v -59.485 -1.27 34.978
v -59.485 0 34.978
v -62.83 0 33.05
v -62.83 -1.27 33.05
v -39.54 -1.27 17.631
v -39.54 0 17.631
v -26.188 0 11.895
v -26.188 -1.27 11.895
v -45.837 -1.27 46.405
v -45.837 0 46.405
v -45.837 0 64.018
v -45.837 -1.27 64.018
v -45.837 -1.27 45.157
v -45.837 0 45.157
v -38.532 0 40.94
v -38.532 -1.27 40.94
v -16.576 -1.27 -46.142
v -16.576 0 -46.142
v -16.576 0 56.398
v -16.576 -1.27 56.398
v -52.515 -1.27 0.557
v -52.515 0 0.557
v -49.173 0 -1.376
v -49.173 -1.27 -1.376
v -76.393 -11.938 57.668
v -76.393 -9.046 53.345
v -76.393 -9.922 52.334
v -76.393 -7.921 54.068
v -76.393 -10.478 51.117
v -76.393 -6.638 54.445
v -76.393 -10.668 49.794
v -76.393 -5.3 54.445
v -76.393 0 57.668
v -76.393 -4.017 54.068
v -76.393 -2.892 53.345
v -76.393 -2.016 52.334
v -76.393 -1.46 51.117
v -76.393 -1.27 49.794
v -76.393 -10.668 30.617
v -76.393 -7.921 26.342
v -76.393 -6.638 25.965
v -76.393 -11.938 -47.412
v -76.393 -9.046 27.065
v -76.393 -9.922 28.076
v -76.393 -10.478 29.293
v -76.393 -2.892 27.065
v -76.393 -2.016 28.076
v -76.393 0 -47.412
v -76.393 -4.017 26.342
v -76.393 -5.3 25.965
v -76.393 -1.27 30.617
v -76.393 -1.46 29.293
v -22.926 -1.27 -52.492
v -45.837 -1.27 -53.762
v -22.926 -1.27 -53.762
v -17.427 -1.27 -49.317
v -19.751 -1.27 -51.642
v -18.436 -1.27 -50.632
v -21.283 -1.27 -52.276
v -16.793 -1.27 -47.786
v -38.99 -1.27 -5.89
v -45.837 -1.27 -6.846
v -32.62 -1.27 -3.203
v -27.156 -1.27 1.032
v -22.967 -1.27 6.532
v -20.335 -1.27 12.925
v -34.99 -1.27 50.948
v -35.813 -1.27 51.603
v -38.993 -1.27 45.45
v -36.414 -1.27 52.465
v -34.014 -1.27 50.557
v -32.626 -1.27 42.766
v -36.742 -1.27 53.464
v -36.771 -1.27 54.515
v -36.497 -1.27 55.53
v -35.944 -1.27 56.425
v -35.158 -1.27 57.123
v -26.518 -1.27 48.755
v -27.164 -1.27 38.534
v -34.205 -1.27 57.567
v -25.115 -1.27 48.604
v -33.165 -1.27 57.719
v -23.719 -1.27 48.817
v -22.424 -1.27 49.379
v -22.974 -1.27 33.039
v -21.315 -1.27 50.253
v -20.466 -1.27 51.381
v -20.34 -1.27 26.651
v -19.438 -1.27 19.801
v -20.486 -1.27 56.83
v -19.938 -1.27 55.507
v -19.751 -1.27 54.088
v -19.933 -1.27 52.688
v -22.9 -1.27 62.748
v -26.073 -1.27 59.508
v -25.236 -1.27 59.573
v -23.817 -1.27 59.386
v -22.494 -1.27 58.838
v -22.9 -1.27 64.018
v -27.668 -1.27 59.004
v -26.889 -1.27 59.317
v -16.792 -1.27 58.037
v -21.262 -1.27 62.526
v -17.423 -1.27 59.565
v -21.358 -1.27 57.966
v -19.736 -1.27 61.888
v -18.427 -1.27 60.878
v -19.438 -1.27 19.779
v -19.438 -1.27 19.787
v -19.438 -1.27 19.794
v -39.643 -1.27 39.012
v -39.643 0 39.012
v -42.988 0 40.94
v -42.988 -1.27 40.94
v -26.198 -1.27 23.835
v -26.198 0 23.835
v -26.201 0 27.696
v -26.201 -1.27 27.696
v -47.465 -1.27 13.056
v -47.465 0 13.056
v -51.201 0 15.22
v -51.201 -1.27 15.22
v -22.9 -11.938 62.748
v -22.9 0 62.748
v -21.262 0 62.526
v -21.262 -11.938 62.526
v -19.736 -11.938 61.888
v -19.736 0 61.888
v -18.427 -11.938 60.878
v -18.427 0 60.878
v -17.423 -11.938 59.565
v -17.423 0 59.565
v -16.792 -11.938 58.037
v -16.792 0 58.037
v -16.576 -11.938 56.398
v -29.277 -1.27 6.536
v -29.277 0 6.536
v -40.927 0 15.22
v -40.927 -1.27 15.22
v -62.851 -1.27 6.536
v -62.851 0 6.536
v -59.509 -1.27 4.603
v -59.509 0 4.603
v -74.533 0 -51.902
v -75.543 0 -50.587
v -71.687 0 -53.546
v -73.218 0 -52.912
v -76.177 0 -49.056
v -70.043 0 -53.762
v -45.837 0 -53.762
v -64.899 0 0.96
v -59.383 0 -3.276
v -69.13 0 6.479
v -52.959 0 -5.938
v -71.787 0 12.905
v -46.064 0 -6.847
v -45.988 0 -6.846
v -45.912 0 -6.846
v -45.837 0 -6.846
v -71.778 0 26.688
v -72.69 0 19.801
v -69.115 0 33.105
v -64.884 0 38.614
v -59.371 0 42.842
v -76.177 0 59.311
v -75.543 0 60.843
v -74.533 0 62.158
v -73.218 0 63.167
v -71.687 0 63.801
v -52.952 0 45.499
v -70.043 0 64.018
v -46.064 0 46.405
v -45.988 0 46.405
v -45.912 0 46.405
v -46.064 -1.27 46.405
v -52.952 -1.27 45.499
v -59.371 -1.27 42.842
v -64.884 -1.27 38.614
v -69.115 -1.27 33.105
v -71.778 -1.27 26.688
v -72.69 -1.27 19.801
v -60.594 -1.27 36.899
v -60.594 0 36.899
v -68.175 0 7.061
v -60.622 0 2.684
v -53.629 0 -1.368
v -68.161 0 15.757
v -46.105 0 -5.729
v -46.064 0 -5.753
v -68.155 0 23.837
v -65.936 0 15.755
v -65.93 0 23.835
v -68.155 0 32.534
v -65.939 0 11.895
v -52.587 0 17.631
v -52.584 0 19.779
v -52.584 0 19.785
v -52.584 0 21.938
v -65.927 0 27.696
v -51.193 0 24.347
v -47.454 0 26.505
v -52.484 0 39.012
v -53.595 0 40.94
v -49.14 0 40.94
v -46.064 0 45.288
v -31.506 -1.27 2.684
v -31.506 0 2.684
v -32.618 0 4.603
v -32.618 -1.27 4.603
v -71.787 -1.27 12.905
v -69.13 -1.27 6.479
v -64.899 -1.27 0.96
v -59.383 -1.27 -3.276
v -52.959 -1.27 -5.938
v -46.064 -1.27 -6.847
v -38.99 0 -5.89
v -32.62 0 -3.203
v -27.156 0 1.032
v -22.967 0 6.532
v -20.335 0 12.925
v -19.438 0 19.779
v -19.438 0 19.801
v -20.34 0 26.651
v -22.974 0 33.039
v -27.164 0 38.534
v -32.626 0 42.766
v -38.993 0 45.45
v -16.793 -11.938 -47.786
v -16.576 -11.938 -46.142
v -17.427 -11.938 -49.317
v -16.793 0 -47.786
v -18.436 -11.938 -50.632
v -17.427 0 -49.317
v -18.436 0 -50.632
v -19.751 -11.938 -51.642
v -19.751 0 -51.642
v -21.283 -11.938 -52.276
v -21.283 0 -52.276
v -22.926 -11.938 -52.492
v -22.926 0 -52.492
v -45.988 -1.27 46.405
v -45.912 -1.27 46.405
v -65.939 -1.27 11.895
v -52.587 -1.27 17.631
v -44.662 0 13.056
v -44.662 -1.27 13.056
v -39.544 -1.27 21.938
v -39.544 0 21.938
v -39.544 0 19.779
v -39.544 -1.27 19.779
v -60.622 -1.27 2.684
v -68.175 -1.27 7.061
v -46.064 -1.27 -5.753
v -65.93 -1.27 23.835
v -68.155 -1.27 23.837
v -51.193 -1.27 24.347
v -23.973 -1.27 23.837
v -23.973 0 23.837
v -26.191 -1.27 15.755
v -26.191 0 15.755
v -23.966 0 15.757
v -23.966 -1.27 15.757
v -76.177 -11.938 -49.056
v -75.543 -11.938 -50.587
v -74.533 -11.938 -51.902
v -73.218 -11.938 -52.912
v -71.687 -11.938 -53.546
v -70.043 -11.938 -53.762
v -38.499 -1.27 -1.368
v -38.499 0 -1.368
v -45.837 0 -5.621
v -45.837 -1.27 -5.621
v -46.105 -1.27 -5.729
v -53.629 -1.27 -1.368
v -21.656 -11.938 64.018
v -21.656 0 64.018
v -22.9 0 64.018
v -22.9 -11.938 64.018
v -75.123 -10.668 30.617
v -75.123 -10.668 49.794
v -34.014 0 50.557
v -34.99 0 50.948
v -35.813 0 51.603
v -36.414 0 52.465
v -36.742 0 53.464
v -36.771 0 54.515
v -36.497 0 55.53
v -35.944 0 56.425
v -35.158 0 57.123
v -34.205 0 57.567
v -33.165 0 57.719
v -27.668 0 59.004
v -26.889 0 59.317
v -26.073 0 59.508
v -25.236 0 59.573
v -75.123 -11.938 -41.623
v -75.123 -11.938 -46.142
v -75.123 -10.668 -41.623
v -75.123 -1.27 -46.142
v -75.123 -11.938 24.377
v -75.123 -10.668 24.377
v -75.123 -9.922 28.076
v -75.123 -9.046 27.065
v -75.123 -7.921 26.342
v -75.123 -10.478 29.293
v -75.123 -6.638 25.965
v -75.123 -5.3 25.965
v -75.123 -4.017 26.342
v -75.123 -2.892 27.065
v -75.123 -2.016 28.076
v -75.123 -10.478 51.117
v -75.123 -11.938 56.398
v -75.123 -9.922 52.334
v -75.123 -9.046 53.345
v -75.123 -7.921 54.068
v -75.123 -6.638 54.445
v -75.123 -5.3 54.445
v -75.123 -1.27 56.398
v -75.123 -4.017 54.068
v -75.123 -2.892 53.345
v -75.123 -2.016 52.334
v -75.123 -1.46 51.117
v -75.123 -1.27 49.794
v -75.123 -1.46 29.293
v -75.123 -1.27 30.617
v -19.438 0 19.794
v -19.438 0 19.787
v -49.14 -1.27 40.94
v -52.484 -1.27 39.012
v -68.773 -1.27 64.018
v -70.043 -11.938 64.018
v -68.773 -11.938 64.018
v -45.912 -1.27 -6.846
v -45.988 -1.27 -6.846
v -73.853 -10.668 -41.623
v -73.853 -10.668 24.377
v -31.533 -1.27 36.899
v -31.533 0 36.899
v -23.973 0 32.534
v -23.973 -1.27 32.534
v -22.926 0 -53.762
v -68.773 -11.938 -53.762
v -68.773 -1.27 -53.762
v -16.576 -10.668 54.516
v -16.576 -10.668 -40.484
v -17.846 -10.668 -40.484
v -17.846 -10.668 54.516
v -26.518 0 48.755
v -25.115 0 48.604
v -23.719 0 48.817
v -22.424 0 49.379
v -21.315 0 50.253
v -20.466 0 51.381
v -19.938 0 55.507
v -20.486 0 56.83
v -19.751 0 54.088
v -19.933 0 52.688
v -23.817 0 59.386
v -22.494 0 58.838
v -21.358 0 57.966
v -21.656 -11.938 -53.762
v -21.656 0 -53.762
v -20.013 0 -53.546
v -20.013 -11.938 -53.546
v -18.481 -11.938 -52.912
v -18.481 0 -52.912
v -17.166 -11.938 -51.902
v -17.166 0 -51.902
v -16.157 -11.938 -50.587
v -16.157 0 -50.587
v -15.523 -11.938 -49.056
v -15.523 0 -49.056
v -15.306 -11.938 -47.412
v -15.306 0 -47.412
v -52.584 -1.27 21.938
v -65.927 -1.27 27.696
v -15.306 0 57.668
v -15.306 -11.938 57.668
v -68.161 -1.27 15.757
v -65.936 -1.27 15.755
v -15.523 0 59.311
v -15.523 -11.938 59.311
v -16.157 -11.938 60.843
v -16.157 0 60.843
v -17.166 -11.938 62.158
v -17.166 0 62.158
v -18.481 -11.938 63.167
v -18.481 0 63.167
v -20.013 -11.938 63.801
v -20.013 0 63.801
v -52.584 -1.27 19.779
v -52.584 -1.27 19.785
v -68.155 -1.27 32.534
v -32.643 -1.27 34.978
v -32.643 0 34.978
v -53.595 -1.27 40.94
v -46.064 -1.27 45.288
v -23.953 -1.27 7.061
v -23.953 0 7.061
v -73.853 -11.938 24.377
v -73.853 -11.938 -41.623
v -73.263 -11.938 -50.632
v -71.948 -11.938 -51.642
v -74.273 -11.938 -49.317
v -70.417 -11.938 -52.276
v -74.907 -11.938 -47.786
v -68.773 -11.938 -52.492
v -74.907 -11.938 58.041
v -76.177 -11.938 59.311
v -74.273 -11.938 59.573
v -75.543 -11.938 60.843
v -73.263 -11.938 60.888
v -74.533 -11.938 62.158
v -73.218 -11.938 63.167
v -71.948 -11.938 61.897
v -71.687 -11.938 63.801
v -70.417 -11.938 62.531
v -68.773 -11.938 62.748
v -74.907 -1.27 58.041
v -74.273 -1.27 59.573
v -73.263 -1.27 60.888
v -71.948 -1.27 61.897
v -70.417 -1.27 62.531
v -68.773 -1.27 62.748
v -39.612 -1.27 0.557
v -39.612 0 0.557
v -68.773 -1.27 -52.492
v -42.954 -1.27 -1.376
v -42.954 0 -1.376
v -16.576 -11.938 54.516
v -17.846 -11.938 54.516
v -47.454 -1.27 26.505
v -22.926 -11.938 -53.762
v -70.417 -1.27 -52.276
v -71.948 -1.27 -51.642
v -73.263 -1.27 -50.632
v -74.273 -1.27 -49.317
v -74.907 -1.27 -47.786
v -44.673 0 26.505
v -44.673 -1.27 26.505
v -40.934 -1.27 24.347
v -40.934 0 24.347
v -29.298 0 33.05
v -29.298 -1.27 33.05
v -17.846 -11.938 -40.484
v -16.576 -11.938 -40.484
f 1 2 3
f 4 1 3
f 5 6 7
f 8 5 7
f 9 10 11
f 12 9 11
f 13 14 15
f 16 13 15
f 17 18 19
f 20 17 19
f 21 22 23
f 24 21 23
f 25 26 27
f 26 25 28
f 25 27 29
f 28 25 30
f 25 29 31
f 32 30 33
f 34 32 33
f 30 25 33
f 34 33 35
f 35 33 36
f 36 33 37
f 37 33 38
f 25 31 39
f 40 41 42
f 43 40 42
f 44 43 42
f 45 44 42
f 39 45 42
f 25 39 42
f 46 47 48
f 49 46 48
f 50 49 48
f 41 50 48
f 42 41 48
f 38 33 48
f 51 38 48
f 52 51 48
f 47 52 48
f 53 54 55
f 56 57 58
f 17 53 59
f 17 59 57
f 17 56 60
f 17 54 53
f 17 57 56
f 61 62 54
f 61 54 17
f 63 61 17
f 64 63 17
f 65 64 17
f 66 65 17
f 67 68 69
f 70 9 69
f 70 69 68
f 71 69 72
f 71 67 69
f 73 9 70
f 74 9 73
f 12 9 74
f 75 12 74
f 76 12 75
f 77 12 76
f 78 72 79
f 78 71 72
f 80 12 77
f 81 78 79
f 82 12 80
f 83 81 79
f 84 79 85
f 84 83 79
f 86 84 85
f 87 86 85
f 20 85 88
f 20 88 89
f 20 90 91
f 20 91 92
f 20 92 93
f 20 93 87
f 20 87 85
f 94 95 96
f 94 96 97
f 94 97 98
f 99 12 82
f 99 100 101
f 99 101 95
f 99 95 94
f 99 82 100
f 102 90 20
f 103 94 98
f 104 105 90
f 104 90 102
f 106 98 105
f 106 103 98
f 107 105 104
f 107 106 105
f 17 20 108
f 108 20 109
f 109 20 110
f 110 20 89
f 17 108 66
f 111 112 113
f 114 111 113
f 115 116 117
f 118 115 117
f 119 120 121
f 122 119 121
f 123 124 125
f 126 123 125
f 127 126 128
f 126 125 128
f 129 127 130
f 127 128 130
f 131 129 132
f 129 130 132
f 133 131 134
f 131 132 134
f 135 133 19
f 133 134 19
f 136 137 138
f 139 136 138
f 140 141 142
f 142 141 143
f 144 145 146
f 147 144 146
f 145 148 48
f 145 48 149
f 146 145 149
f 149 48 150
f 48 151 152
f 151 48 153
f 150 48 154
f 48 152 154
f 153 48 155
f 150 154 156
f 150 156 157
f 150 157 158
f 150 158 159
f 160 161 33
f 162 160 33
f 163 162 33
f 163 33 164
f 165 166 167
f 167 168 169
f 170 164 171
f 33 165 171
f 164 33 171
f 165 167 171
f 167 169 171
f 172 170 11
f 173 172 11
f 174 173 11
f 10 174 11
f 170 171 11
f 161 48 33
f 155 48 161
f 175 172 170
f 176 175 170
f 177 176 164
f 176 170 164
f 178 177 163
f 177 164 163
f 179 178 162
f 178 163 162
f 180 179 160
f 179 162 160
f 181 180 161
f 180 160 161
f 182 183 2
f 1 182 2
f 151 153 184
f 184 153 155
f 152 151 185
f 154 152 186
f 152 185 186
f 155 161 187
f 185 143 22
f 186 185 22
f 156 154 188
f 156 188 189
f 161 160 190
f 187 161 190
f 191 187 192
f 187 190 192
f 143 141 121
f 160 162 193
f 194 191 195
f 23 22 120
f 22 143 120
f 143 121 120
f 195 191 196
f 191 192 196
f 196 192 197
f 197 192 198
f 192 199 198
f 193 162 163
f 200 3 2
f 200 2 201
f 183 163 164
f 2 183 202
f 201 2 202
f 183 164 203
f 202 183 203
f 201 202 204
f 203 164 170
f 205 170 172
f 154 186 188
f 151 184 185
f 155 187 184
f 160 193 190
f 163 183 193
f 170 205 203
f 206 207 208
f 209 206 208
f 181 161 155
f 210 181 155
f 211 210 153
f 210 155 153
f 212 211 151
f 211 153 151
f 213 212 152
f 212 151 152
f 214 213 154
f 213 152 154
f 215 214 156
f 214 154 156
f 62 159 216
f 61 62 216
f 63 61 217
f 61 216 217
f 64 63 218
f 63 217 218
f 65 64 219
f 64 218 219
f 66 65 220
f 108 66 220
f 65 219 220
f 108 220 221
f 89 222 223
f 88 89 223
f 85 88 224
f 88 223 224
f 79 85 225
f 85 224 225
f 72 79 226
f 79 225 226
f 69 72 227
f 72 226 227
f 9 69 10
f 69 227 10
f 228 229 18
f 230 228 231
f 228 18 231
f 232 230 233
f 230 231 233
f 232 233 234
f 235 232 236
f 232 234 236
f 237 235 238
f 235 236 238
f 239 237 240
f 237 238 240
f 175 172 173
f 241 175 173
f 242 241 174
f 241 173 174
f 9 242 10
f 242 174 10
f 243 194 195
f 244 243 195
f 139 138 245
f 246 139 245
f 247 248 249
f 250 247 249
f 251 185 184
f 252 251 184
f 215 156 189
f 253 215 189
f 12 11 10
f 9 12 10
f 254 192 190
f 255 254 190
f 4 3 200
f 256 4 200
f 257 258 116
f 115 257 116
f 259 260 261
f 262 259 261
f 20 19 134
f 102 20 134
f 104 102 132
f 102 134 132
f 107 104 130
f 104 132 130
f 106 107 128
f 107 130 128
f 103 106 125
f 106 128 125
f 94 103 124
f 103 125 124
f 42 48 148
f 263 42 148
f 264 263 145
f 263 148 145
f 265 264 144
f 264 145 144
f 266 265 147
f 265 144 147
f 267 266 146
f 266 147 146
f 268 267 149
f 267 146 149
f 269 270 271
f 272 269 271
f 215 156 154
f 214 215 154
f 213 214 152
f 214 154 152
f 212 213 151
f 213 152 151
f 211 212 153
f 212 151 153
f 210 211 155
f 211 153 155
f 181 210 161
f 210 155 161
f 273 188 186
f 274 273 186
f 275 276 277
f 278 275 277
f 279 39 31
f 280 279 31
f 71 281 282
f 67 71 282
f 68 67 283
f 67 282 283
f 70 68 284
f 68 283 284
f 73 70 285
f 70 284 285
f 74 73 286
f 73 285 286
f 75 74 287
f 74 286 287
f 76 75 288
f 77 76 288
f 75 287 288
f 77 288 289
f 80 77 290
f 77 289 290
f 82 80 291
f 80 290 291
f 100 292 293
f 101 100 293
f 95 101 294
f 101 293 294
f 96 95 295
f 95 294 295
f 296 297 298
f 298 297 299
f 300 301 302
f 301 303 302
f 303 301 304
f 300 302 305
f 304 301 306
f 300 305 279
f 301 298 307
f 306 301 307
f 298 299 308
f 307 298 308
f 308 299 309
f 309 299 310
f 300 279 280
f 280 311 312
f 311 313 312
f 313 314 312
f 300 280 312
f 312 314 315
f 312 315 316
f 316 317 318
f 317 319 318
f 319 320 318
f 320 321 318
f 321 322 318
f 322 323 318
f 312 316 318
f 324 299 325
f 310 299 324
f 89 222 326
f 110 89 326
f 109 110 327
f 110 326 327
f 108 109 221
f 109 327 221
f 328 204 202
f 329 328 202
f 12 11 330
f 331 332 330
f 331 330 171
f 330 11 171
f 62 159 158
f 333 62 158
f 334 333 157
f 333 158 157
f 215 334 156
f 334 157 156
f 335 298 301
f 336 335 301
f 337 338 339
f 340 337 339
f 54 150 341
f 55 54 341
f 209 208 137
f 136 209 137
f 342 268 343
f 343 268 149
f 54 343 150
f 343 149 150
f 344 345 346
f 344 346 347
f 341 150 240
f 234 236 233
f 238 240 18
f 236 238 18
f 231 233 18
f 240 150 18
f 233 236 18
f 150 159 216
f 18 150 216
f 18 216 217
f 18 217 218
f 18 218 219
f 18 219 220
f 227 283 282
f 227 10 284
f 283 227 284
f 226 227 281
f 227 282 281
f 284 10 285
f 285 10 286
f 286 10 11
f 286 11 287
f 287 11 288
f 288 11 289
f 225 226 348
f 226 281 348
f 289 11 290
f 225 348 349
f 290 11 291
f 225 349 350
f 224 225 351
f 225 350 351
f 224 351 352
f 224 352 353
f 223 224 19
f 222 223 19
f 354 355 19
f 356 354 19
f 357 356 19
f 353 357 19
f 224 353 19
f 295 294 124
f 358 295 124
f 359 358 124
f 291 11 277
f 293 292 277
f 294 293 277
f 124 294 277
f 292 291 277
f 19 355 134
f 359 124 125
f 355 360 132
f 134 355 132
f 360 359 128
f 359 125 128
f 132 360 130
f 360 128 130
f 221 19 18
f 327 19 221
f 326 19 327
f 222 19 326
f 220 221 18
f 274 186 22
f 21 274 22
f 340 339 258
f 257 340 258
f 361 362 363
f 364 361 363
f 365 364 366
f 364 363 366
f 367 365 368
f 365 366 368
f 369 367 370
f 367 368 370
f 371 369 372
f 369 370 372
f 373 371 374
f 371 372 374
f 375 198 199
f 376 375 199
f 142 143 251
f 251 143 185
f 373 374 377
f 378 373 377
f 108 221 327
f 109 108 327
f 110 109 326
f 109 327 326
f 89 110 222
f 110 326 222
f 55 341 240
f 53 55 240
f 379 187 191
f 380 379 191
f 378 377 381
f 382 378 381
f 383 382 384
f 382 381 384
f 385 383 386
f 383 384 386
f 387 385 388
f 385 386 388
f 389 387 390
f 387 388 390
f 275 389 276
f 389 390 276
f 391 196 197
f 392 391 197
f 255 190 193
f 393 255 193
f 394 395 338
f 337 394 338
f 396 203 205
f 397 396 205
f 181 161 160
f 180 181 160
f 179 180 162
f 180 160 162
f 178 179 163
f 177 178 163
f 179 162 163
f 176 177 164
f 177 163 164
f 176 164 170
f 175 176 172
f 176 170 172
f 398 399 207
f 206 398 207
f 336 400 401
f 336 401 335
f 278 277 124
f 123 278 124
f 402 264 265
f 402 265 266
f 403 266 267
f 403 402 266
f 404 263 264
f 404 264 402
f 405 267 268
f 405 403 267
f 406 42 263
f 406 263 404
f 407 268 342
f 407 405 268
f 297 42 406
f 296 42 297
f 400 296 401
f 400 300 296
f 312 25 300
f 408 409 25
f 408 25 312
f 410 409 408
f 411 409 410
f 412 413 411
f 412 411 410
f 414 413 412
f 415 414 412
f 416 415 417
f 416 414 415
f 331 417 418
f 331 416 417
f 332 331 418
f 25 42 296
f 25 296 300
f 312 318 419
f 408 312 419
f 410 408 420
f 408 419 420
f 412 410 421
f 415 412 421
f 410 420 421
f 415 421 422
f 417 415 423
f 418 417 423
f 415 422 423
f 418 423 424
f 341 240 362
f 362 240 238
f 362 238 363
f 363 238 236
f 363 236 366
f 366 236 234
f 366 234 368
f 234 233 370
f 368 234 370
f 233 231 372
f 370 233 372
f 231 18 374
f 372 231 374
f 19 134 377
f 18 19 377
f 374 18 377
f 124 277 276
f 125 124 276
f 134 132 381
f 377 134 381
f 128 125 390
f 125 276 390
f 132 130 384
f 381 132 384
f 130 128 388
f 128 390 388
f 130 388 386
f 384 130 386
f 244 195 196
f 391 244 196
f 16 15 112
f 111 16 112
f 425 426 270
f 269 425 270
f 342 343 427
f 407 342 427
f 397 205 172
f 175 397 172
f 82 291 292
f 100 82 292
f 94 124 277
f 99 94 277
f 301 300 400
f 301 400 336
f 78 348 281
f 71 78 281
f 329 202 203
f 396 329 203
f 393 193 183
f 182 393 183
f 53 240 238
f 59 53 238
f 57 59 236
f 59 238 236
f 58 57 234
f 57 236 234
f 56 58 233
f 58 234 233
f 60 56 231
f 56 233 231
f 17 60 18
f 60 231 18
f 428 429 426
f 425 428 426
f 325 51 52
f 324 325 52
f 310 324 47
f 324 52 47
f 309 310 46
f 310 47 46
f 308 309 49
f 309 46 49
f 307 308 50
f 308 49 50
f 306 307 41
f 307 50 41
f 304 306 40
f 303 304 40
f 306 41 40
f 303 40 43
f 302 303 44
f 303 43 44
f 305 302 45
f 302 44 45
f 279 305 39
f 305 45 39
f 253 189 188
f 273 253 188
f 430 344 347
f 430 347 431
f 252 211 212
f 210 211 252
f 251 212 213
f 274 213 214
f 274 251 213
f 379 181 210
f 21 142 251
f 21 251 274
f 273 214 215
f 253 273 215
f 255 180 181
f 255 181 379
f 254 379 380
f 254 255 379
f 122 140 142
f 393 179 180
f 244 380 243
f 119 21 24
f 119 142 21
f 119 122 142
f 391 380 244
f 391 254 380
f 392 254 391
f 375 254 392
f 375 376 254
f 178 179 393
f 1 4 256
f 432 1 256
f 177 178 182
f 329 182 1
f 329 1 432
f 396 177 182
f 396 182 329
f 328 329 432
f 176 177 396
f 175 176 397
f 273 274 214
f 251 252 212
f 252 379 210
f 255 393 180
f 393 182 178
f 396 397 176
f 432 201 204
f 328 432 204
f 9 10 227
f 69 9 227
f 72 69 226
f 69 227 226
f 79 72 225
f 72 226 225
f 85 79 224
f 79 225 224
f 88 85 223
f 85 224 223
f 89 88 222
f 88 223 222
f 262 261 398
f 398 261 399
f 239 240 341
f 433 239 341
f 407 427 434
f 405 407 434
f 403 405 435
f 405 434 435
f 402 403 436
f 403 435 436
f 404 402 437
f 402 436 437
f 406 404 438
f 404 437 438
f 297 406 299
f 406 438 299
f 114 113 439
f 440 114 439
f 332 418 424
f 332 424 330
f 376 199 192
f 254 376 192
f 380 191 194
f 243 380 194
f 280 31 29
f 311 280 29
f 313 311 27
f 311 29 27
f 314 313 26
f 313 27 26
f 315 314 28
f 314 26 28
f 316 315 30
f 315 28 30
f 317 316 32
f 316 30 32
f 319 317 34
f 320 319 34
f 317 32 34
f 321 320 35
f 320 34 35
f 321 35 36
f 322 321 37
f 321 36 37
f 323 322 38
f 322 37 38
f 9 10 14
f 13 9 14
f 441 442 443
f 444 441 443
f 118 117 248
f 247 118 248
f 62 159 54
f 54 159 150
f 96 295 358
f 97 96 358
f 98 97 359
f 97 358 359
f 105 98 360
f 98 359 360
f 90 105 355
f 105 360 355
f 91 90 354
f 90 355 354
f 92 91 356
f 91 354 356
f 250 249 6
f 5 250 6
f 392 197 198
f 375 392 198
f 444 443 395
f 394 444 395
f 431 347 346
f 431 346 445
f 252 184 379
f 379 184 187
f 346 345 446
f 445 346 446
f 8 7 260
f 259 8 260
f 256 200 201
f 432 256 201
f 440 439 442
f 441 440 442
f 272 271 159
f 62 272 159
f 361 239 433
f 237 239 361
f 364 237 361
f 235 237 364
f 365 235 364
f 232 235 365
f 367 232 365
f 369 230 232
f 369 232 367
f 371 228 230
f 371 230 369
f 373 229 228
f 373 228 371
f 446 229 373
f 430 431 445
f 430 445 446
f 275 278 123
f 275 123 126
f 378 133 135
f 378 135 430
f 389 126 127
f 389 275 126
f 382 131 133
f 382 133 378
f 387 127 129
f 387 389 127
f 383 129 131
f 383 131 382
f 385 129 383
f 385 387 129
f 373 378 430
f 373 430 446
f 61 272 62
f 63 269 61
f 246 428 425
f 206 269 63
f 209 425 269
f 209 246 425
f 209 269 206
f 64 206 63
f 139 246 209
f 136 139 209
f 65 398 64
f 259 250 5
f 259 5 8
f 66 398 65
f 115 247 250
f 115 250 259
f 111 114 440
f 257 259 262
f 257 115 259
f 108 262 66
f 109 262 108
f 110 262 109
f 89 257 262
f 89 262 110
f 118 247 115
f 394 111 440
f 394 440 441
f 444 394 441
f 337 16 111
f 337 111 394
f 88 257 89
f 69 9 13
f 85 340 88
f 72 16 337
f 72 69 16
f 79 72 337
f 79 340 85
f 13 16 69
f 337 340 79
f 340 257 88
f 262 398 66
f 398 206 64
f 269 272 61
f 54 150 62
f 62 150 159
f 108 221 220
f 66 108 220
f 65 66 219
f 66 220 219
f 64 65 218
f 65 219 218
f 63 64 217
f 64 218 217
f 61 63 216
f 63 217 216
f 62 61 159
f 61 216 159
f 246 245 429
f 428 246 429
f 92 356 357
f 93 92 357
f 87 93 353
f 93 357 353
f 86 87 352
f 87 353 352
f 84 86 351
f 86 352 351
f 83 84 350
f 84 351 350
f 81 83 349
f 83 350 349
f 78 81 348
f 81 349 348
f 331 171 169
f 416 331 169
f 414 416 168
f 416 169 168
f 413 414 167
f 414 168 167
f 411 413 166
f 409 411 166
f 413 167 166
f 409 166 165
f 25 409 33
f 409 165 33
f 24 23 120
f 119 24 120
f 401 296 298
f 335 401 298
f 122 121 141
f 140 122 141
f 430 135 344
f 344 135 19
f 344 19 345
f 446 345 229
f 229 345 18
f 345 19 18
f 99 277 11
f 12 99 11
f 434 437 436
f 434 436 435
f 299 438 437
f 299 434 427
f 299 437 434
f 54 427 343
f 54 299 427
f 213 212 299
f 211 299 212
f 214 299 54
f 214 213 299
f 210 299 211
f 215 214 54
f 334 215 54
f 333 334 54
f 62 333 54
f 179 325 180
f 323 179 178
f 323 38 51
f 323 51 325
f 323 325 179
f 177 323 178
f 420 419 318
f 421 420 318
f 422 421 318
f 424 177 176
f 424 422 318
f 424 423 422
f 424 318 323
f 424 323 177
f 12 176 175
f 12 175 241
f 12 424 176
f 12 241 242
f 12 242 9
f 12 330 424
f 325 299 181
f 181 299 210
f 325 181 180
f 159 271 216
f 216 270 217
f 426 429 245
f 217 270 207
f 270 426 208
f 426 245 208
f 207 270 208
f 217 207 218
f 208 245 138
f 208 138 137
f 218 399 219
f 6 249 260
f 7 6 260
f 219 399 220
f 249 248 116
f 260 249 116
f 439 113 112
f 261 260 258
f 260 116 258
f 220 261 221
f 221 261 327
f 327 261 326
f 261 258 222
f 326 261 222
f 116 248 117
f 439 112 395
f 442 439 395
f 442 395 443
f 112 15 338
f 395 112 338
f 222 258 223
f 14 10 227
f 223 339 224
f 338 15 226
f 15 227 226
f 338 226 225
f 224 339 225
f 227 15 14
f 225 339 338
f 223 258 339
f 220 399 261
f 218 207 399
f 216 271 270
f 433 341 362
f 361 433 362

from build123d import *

# Parameters (mm, degrees)
F1_DEPTH  = 1.27
F2_DEPTH  = 11.938
F4_DEPTH  = 25.4
F5_DEPTH  = 1.27
F6_DEPTH  = 1.27
F7_W      = 1.27
F7_H      = 66
F8_DEPTH  = 1.27
F9_W      = 1.27
F9_H      = 95
F10_DEPTH = 1.27


# Not quite as in the source:
# - ends of sketch curves that miss each other by under 0.0002 mm in the source are joined


with BuildPart() as f1:
    # F0 (on Front) → F1 (new body)
    with BuildSketch(Plane.XZ):
        with BuildLine():
            ThreePointArc((-68.7733714747, 62.7475070371), (-73.2634995352, 60.8876350976), (-75.1233714747, 56.3975070371))
            Line((-75.1233714747, 56.3975070371), (-75.1233714747, -46.1422929629))
            ThreePointArc((-75.1233714747, -46.1422929629), (-73.2634995352, -50.6324210235), (-68.7733714747, -52.4922929629))
            Line((-68.7733714747, -52.4922929629), (-68.7733714747, -53.7622929629))
            Line((-68.7733714747, -53.7622929629), (-45.83683555, -53.7622929629))
            Line((-45.83683555, -53.7622929629), (-45.83683555, -6.8455746123))
            ThreePointArc((-45.83683555, -6.8455746123), (-45.9503157475, -6.8463001174), (-46.0637980065, -6.8465419539))
            ThreePointArc((-46.0637980065, -6.8465419539), (-64.8987750617, 0.95958485), (-72.689796607, 19.800815161))
            ThreePointArc((-72.689796607, 19.800815161), (-64.8836783627, 38.6144422615), (-46.0637980065, 46.4054723665))
            ThreePointArc((-46.0637980065, 46.4054723665), (-45.9503157475, 46.4052305299), (-45.83683555, 46.4045050248))
            Line((-45.83683555, 46.4045050248), (-45.83683555, 64.0175070371))
            Line((-45.83683555, 64.0175070371), (-68.7733714747, 64.0175070371))
            Line((-68.7733714747, 64.0175070371), (-68.7733714747, 62.7475070371))
        make_face()
    extrude(amount=F1_DEPTH)

    # F0 (on Front) → F2 (join)
    with BuildSketch(Plane.XZ):
        with BuildLine():
            Line((-75.1233714747, -46.1422929629), (-75.1233714747, 56.3975070371))
            ThreePointArc((-75.1233714747, 56.3975070371), (-73.2634995352, 60.8876350976), (-68.7733714747, 62.7475070371))
            Line((-68.7733714747, 62.7475070371), (-68.7733714747, 64.0175070371))
            Line((-68.7733714747, 64.0175070371), (-70.0433714747, 64.0175070371))
            ThreePointArc((-70.0433714747, 64.0175070371), (-74.5334995352, 62.1576350976), (-76.3933714747, 57.6675070371))
            Line((-76.3933714747, 57.6675070371), (-76.3933714747, -47.4122929629))
            ThreePointArc((-76.3933714747, -47.4122929629), (-74.5334995352, -51.9024210235), (-70.0433714747, -53.7622929629))
            Line((-70.0433714747, -53.7622929629), (-68.7733714747, -53.7622929629))
            Line((-68.7733714747, -53.7622929629), (-68.7733714747, -52.4922929629))
            ThreePointArc((-68.7733714747, -52.4922929629), (-73.2634995352, -50.6324210235), (-75.1233714747, -46.1422929629))
        make_face()
    extrude(amount=F2_DEPTH)

    # F3 (on face) → F4 (cut)
    with BuildSketch(Plane(origin=(-76.3933714747, 0, 0), x_dir=(0, -1, 0), z_dir=(-1, 0, 0))):
        with BuildLine():
            Line((10.668, 30.6165070371), (10.668, 49.7935070371))
            ThreePointArc((10.668, 49.7935070371), (5.969, 45.0945070371), (1.27, 49.7935070371))
            Line((1.27, 49.7935070371), (1.27, 30.6165070371))
            ThreePointArc((1.27, 30.6165070371), (5.969, 35.3155070371), (10.668, 30.6165070371))
        make_face()
        with BuildLine():
            ThreePointArc((1.27, 49.7935070371), (5.969, 45.0945070371), (10.668, 49.7935070371))
            ThreePointArc((10.668, 49.7935070371), (5.969, 54.4925070371), (1.27, 49.7935070371))
        make_face()
        with BuildLine():
            ThreePointArc((1.27, 30.6165070371), (5.969, 25.9175070371), (10.668, 30.6165070371))
            ThreePointArc((10.668, 30.6165070371), (5.969, 35.3155070371), (1.27, 30.6165070371))
        make_face()
    extrude(amount=-F4_DEPTH, mode=Mode.SUBTRACT)

    # F7 (on face) → F8 (join)
    with BuildSketch(Plane.YZ.offset(-75.1233714747)):
        with Locations((-11.303, -8.6227470934)):
            Rectangle(F7_W, F7_H)
    extrude(amount=F8_DEPTH)


with BuildPart() as f2:
    # F0 (on Front) → F2, piece 2 (new body)
    with BuildSketch(Plane.XZ):
        with BuildLine():
            Line((-21.6563714747, 64.0175070371), (-22.9002996252, 64.0175070371))
            Line((-22.9002996252, 64.0175070371), (-22.9002996252, 62.7475070371))
            ThreePointArc((-22.9002996252, 62.7475070371), (-18.4270350656, 60.8784613489), (-16.5763714747, 56.3975605602))
            Line((-16.5763714747, 56.3975605602), (-16.5763714747, -46.1422929629))
            ThreePointArc((-16.5763714747, -46.1422929629), (-18.4362434142, -50.6324210235), (-22.9263714747, -52.4922929629))
            Line((-22.9263714747, -52.4922929629), (-22.9263714747, -53.7622929629))
            Line((-22.9263714747, -53.7622929629), (-21.6563714747, -53.7622929629))
            ThreePointArc((-21.6563714747, -53.7622929629), (-17.1662434142, -51.9024210235), (-15.3063714747, -47.4122929629))
            Line((-15.3063714747, -47.4122929629), (-15.3063714747, 57.6675070371))
            ThreePointArc((-15.3063714747, 57.6675070371), (-17.1662434142, 62.1576350976), (-21.6563714747, 64.0175070371))
        make_face()
    extrude(amount=F2_DEPTH)

    # F9 (on face) → F10 (join)
    with BuildSketch(Plane(origin=(-16.5763714747, 0, 0), x_dir=(0, -1, 0), z_dir=(-1, 0, 0))):
        with Locations((11.303, 7.0158497989)):
            Rectangle(F9_W, F9_H)
    extrude(amount=F10_DEPTH)


with BuildPart() as f5:
    # F0 (on Front) → F5 (new body)
    with BuildSketch(Plane.XZ):
        with BuildLine():
            Line((-22.9002996252, 64.0175070371), (-45.83683555, 64.0175070371))
            Line((-45.83683555, 64.0175070371), (-45.83683555, 46.4045050248))
            ThreePointArc((-45.83683555, 46.4045050248), (-27.1638123458, 38.534059292), (-19.437799406, 19.800815161))
            ThreePointArc((-19.437799406, 19.800815161), (-19.4377929862, 19.7901401845), (-19.4377908463, 19.7794652063))
            ThreePointArc((-19.4377908463, 19.7794652063), (-27.1562947169, 1.0324500665), (-45.83683555, -6.8455746123))
            Line((-45.83683555, -6.8455746123), (-45.83683555, -53.7622929629))
            Line((-45.83683555, -53.7622929629), (-22.9263714747, -53.7622929629))
            Line((-22.9263714747, -53.7622929629), (-22.9263714747, -52.4922929629))
            ThreePointArc((-22.9263714747, -52.4922929629), (-18.4362434142, -50.6324210235), (-16.5763714747, -46.1422929629))
            Line((-16.5763714747, -46.1422929629), (-16.5763714747, 56.3975605602))
            ThreePointArc((-16.5763714747, 56.3975605602), (-18.4270350656, 60.8784613489), (-22.9002996252, 62.7475070371))
            Line((-22.9002996252, 62.7475070371), (-22.9002996252, 64.0175070371))
        make_face()
        with BuildLine():
            ThreePointArc((-25.2361353487, 59.5725070371), (-21.3578216202, 57.9660568916), (-19.7513714747, 54.0877431631))
            ThreePointArc((-19.7513714747, 54.0877431631), (-21.8412711567, 49.7798977769), (-26.5183106895, 48.7549520413))
            Line((-26.5183106895, 48.7549520413), (-34.0138568088, 50.5571235836))
            ThreePointArc((-34.0138568088, 50.5571235836), (-36.7709747399, 54.5151516939), (-33.1649817526, 57.7189775918))
            Line((-33.1649817526, 57.7189775918), (-27.6676093993, 59.0041004217))
            ThreePointArc((-27.6676093993, 59.0041004217), (-26.4846496797, 59.4285152719), (-25.2361353487, 59.5725070371))
        make_face(mode=Mode.SUBTRACT)
    extrude(amount=F5_DEPTH)


with BuildPart() as f6:
    # F0 (on Front) → F6 (new body)
    with BuildSketch(Plane.XZ):
        with BuildLine():
            ThreePointArc((-19.437799406, 19.800815161), (-27.1638123458, 38.534059292), (-45.83683555, 46.4045050248))
            Line((-45.83683555, 46.4045050248), (-45.83683555, 45.1567237107))
            Line((-45.83683555, 45.1567237107), (-38.5324436739, 40.9395310947))
            Line((-38.5324436739, 40.9395310947), (-31.5334607695, 36.8986664309))
            Line((-31.5334607695, 36.8986664309), (-23.972966235, 32.5336128762))
            Line((-23.972966235, 32.5336128762), (-23.972966235, 23.8371539736))
            Line((-23.972966235, 23.8371539736), (-23.972966235, 19.8148920808))
            Line((-23.972966235, 19.8148920808), (-23.972966235, 19.7971786549))
            Line((-23.972966235, 19.7971786549), (-19.437799406, 19.800815161))
        make_face()
        with BuildLine():
            Line((-45.83683555, -5.6209802107), (-45.83683555, -6.8455746123))
            ThreePointArc((-45.83683555, -6.8455746123), (-27.1562947169, 1.0324500665), (-19.4377908463, 19.7794652063))
            ThreePointArc((-19.4377908463, 19.7794652063), (-19.4377929862, 19.7901401845), (-19.437799406, 19.800815161))
            Line((-19.437799406, 19.800815161), (-23.972966235, 19.7971786549))
            Line((-23.972966235, 19.7971786549), (-23.972966235, 19.7794652063))
            Line((-23.972966235, 19.7794652063), (-23.9664873618, 15.7572085313))
            Line((-23.9664873618, 15.7572085313), (-23.9525409264, 7.0607608116))
            Line((-23.9525409264, 7.0607608116), (-31.5060255403, 2.6835881708))
            Line((-31.5060255403, 2.6835881708), (-38.4985191452, -1.3684955049))
            Line((-38.4985191452, -1.3684955049), (-45.83683555, -5.6209802107))
        make_face()
        Polygon((-31.5334607695, 36.8986664309), (-38.5324436739, 40.9395310947), (-39.6432602587, 39.0119725608), (-32.6425828079, 34.9776107085), align=None)
        Polygon((-23.972966235, 19.7794652063), (-23.972966235, 19.7971786549), (-26.1944497484, 19.7953973669), (-26.1912103118, 15.7554246458), (-23.9664873618, 15.7572085313), align=None)
        Polygon((-26.1944497484, 19.7953973669), (-23.972966235, 19.7971786549), (-23.972966235, 19.8148920808), (-23.972966235, 23.8371539736), (-26.1976891851, 23.835370088), align=None)
        Polygon((-39.6124255104, 0.5572791435), (-38.4985191452, -1.3684955049), (-31.5060255403, 2.6835881708), (-32.6182269329, 4.6028627334), align=None)
        Polygon((-39.6432602587, 39.0119725608), (-42.988080594, 40.9395310947), (-44.6731523984, 26.5053643083), (-40.9343213249, 24.3467491815), (-29.2977624726, 33.0500521746), (-32.6425828079, 34.9776107085), align=None)
        Polygon((-26.1912103118, 15.7554246458), (-26.1944497484, 19.7953973669), (-39.5436757168, 19.7846933413), (-39.5436757168, 19.7794652063), (-39.5402223489, 17.6313091186), (-26.1881148018, 11.8949459974), align=None)
        Polygon((-39.5436757168, 19.7846933413), (-26.1944497484, 19.7953973669), (-26.1976891851, 23.835370088), (-26.200784695, 27.6958487364), (-39.5436757168, 21.938080333), (-39.5436757168, 19.7899214696), align=None)
        Polygon((-44.6623679209, 13.0558049194), (-42.9541503357, -1.375640971), (-39.6124255104, 0.5572791435), (-32.6182269329, 4.6028627334), (-29.2765021076, 6.5357828479), (-40.9270034074, 15.2204132012), align=None)
    extrude(amount=F6_DEPTH)


with BuildPart() as f6b:
    # F0 (on Front) → F6, piece 2 (new body)
    with BuildSketch(Plane.XZ):
        with BuildLine():
            Line((-46.0637980065, 45.2877605461), (-46.0637980065, 46.4054723665))
            ThreePointArc((-46.0637980065, 46.4054723665), (-64.8836783627, 38.6144422615), (-72.689796607, 19.800815161))
            Line((-72.689796607, 19.800815161), (-68.154629778, 19.7971786549))
            Line((-68.154629778, 19.7971786549), (-68.1546013711, 19.8148920808))
            Line((-68.1546013711, 19.8148920808), (-68.154629778, 23.8371539736))
            Line((-68.154629778, 23.8371539736), (-68.154629778, 32.5336128762))
            Line((-68.154629778, 32.5336128762), (-60.5941352435, 36.8986664309))
            Line((-60.5941352435, 36.8986664309), (-53.5951523391, 40.9395310947))
            Line((-53.5951523391, 40.9395310947), (-46.0637980065, 45.2877605461))
        make_face()
        with BuildLine():
            ThreePointArc((-72.689796607, 19.800815161), (-64.8987750617, 0.95958485), (-46.0637980065, -6.8465419539))
            Line((-46.0637980065, -6.8465419539), (-46.0637980065, -5.7525028001))
            Line((-46.0637980065, -5.7525028001), (-46.1047054376, -5.7287973321))
            Line((-46.1047054376, -5.7287973321), (-53.6290768678, -1.3684955049))
            Line((-53.6290768678, -1.3684955049), (-60.6215704726, 2.6835881708))
            Line((-60.6215704726, 2.6835881708), (-68.1750550866, 7.0607608116))
            Line((-68.1750550866, 7.0607608116), (-68.1611086512, 15.7572085313))
            Line((-68.1611086512, 15.7572085313), (-68.1546581848, 19.7794652518))
            Line((-68.1546581848, 19.7794652518), (-68.154629778, 19.7971786549))
            Line((-68.154629778, 19.7971786549), (-72.689796607, 19.800815161))
        make_face()
        Polygon((-52.4843357543, 39.0119725608), (-53.5951523391, 40.9395310947), (-60.5941352435, 36.8986664309), (-59.4850132051, 34.9776107085), align=None)
        Polygon((-65.9331462645, 19.7953973669), (-68.154629778, 19.7971786549), (-68.1546581848, 19.7794652518), (-68.1611086512, 15.7572085313), (-65.9363857011, 15.7554246458), align=None)
        Polygon((-68.1546013711, 19.8148920808), (-68.154629778, 19.7971786549), (-65.9331462645, 19.7953973669), (-65.9299068279, 23.835370088), (-68.154629778, 23.8371539736), align=None)
        Polygon((-47.4544436145, 26.5053643083), (-49.139515419, 40.9395310947), (-52.4843357543, 39.0119725608), (-59.4850132051, 34.9776107085), (-62.8298335403, 33.0500521746), (-51.1932746881, 24.3467491815), align=None)
        Polygon((-52.5839202961, 19.7846933413), (-65.9331462645, 19.7953973669), (-65.9363857011, 15.7554246458), (-65.9394812111, 11.8949459974), (-52.5873736641, 17.6313091186), (-52.5839286804, 19.7794652197), align=None)
        Polygon((-65.9299068279, 23.835370088), (-65.9331462645, 19.7953973669), (-52.5839202961, 19.7846933413), (-52.5839202961, 19.7899214696), (-52.5839202961, 21.938080333), (-65.9268113179, 27.6958487364), align=None)
        Polygon((-60.6215704726, 2.6835881708), (-53.6290768678, -1.3684955049), (-52.5151705026, 0.5572791435), (-59.5093690801, 4.6028627334), align=None)
        Polygon((-49.1734456773, -1.375640971), (-47.4652280921, 13.0558049194), (-51.2005926056, 15.2204132012), (-62.8510939054, 6.5357828479), (-59.5093690801, 4.6028627334), (-52.5151705026, 0.5572791435), align=None)
    extrude(amount=F6_DEPTH)


solid = Compound([f1.part, f2.part, f5.part, f6.part, f6b.part])
